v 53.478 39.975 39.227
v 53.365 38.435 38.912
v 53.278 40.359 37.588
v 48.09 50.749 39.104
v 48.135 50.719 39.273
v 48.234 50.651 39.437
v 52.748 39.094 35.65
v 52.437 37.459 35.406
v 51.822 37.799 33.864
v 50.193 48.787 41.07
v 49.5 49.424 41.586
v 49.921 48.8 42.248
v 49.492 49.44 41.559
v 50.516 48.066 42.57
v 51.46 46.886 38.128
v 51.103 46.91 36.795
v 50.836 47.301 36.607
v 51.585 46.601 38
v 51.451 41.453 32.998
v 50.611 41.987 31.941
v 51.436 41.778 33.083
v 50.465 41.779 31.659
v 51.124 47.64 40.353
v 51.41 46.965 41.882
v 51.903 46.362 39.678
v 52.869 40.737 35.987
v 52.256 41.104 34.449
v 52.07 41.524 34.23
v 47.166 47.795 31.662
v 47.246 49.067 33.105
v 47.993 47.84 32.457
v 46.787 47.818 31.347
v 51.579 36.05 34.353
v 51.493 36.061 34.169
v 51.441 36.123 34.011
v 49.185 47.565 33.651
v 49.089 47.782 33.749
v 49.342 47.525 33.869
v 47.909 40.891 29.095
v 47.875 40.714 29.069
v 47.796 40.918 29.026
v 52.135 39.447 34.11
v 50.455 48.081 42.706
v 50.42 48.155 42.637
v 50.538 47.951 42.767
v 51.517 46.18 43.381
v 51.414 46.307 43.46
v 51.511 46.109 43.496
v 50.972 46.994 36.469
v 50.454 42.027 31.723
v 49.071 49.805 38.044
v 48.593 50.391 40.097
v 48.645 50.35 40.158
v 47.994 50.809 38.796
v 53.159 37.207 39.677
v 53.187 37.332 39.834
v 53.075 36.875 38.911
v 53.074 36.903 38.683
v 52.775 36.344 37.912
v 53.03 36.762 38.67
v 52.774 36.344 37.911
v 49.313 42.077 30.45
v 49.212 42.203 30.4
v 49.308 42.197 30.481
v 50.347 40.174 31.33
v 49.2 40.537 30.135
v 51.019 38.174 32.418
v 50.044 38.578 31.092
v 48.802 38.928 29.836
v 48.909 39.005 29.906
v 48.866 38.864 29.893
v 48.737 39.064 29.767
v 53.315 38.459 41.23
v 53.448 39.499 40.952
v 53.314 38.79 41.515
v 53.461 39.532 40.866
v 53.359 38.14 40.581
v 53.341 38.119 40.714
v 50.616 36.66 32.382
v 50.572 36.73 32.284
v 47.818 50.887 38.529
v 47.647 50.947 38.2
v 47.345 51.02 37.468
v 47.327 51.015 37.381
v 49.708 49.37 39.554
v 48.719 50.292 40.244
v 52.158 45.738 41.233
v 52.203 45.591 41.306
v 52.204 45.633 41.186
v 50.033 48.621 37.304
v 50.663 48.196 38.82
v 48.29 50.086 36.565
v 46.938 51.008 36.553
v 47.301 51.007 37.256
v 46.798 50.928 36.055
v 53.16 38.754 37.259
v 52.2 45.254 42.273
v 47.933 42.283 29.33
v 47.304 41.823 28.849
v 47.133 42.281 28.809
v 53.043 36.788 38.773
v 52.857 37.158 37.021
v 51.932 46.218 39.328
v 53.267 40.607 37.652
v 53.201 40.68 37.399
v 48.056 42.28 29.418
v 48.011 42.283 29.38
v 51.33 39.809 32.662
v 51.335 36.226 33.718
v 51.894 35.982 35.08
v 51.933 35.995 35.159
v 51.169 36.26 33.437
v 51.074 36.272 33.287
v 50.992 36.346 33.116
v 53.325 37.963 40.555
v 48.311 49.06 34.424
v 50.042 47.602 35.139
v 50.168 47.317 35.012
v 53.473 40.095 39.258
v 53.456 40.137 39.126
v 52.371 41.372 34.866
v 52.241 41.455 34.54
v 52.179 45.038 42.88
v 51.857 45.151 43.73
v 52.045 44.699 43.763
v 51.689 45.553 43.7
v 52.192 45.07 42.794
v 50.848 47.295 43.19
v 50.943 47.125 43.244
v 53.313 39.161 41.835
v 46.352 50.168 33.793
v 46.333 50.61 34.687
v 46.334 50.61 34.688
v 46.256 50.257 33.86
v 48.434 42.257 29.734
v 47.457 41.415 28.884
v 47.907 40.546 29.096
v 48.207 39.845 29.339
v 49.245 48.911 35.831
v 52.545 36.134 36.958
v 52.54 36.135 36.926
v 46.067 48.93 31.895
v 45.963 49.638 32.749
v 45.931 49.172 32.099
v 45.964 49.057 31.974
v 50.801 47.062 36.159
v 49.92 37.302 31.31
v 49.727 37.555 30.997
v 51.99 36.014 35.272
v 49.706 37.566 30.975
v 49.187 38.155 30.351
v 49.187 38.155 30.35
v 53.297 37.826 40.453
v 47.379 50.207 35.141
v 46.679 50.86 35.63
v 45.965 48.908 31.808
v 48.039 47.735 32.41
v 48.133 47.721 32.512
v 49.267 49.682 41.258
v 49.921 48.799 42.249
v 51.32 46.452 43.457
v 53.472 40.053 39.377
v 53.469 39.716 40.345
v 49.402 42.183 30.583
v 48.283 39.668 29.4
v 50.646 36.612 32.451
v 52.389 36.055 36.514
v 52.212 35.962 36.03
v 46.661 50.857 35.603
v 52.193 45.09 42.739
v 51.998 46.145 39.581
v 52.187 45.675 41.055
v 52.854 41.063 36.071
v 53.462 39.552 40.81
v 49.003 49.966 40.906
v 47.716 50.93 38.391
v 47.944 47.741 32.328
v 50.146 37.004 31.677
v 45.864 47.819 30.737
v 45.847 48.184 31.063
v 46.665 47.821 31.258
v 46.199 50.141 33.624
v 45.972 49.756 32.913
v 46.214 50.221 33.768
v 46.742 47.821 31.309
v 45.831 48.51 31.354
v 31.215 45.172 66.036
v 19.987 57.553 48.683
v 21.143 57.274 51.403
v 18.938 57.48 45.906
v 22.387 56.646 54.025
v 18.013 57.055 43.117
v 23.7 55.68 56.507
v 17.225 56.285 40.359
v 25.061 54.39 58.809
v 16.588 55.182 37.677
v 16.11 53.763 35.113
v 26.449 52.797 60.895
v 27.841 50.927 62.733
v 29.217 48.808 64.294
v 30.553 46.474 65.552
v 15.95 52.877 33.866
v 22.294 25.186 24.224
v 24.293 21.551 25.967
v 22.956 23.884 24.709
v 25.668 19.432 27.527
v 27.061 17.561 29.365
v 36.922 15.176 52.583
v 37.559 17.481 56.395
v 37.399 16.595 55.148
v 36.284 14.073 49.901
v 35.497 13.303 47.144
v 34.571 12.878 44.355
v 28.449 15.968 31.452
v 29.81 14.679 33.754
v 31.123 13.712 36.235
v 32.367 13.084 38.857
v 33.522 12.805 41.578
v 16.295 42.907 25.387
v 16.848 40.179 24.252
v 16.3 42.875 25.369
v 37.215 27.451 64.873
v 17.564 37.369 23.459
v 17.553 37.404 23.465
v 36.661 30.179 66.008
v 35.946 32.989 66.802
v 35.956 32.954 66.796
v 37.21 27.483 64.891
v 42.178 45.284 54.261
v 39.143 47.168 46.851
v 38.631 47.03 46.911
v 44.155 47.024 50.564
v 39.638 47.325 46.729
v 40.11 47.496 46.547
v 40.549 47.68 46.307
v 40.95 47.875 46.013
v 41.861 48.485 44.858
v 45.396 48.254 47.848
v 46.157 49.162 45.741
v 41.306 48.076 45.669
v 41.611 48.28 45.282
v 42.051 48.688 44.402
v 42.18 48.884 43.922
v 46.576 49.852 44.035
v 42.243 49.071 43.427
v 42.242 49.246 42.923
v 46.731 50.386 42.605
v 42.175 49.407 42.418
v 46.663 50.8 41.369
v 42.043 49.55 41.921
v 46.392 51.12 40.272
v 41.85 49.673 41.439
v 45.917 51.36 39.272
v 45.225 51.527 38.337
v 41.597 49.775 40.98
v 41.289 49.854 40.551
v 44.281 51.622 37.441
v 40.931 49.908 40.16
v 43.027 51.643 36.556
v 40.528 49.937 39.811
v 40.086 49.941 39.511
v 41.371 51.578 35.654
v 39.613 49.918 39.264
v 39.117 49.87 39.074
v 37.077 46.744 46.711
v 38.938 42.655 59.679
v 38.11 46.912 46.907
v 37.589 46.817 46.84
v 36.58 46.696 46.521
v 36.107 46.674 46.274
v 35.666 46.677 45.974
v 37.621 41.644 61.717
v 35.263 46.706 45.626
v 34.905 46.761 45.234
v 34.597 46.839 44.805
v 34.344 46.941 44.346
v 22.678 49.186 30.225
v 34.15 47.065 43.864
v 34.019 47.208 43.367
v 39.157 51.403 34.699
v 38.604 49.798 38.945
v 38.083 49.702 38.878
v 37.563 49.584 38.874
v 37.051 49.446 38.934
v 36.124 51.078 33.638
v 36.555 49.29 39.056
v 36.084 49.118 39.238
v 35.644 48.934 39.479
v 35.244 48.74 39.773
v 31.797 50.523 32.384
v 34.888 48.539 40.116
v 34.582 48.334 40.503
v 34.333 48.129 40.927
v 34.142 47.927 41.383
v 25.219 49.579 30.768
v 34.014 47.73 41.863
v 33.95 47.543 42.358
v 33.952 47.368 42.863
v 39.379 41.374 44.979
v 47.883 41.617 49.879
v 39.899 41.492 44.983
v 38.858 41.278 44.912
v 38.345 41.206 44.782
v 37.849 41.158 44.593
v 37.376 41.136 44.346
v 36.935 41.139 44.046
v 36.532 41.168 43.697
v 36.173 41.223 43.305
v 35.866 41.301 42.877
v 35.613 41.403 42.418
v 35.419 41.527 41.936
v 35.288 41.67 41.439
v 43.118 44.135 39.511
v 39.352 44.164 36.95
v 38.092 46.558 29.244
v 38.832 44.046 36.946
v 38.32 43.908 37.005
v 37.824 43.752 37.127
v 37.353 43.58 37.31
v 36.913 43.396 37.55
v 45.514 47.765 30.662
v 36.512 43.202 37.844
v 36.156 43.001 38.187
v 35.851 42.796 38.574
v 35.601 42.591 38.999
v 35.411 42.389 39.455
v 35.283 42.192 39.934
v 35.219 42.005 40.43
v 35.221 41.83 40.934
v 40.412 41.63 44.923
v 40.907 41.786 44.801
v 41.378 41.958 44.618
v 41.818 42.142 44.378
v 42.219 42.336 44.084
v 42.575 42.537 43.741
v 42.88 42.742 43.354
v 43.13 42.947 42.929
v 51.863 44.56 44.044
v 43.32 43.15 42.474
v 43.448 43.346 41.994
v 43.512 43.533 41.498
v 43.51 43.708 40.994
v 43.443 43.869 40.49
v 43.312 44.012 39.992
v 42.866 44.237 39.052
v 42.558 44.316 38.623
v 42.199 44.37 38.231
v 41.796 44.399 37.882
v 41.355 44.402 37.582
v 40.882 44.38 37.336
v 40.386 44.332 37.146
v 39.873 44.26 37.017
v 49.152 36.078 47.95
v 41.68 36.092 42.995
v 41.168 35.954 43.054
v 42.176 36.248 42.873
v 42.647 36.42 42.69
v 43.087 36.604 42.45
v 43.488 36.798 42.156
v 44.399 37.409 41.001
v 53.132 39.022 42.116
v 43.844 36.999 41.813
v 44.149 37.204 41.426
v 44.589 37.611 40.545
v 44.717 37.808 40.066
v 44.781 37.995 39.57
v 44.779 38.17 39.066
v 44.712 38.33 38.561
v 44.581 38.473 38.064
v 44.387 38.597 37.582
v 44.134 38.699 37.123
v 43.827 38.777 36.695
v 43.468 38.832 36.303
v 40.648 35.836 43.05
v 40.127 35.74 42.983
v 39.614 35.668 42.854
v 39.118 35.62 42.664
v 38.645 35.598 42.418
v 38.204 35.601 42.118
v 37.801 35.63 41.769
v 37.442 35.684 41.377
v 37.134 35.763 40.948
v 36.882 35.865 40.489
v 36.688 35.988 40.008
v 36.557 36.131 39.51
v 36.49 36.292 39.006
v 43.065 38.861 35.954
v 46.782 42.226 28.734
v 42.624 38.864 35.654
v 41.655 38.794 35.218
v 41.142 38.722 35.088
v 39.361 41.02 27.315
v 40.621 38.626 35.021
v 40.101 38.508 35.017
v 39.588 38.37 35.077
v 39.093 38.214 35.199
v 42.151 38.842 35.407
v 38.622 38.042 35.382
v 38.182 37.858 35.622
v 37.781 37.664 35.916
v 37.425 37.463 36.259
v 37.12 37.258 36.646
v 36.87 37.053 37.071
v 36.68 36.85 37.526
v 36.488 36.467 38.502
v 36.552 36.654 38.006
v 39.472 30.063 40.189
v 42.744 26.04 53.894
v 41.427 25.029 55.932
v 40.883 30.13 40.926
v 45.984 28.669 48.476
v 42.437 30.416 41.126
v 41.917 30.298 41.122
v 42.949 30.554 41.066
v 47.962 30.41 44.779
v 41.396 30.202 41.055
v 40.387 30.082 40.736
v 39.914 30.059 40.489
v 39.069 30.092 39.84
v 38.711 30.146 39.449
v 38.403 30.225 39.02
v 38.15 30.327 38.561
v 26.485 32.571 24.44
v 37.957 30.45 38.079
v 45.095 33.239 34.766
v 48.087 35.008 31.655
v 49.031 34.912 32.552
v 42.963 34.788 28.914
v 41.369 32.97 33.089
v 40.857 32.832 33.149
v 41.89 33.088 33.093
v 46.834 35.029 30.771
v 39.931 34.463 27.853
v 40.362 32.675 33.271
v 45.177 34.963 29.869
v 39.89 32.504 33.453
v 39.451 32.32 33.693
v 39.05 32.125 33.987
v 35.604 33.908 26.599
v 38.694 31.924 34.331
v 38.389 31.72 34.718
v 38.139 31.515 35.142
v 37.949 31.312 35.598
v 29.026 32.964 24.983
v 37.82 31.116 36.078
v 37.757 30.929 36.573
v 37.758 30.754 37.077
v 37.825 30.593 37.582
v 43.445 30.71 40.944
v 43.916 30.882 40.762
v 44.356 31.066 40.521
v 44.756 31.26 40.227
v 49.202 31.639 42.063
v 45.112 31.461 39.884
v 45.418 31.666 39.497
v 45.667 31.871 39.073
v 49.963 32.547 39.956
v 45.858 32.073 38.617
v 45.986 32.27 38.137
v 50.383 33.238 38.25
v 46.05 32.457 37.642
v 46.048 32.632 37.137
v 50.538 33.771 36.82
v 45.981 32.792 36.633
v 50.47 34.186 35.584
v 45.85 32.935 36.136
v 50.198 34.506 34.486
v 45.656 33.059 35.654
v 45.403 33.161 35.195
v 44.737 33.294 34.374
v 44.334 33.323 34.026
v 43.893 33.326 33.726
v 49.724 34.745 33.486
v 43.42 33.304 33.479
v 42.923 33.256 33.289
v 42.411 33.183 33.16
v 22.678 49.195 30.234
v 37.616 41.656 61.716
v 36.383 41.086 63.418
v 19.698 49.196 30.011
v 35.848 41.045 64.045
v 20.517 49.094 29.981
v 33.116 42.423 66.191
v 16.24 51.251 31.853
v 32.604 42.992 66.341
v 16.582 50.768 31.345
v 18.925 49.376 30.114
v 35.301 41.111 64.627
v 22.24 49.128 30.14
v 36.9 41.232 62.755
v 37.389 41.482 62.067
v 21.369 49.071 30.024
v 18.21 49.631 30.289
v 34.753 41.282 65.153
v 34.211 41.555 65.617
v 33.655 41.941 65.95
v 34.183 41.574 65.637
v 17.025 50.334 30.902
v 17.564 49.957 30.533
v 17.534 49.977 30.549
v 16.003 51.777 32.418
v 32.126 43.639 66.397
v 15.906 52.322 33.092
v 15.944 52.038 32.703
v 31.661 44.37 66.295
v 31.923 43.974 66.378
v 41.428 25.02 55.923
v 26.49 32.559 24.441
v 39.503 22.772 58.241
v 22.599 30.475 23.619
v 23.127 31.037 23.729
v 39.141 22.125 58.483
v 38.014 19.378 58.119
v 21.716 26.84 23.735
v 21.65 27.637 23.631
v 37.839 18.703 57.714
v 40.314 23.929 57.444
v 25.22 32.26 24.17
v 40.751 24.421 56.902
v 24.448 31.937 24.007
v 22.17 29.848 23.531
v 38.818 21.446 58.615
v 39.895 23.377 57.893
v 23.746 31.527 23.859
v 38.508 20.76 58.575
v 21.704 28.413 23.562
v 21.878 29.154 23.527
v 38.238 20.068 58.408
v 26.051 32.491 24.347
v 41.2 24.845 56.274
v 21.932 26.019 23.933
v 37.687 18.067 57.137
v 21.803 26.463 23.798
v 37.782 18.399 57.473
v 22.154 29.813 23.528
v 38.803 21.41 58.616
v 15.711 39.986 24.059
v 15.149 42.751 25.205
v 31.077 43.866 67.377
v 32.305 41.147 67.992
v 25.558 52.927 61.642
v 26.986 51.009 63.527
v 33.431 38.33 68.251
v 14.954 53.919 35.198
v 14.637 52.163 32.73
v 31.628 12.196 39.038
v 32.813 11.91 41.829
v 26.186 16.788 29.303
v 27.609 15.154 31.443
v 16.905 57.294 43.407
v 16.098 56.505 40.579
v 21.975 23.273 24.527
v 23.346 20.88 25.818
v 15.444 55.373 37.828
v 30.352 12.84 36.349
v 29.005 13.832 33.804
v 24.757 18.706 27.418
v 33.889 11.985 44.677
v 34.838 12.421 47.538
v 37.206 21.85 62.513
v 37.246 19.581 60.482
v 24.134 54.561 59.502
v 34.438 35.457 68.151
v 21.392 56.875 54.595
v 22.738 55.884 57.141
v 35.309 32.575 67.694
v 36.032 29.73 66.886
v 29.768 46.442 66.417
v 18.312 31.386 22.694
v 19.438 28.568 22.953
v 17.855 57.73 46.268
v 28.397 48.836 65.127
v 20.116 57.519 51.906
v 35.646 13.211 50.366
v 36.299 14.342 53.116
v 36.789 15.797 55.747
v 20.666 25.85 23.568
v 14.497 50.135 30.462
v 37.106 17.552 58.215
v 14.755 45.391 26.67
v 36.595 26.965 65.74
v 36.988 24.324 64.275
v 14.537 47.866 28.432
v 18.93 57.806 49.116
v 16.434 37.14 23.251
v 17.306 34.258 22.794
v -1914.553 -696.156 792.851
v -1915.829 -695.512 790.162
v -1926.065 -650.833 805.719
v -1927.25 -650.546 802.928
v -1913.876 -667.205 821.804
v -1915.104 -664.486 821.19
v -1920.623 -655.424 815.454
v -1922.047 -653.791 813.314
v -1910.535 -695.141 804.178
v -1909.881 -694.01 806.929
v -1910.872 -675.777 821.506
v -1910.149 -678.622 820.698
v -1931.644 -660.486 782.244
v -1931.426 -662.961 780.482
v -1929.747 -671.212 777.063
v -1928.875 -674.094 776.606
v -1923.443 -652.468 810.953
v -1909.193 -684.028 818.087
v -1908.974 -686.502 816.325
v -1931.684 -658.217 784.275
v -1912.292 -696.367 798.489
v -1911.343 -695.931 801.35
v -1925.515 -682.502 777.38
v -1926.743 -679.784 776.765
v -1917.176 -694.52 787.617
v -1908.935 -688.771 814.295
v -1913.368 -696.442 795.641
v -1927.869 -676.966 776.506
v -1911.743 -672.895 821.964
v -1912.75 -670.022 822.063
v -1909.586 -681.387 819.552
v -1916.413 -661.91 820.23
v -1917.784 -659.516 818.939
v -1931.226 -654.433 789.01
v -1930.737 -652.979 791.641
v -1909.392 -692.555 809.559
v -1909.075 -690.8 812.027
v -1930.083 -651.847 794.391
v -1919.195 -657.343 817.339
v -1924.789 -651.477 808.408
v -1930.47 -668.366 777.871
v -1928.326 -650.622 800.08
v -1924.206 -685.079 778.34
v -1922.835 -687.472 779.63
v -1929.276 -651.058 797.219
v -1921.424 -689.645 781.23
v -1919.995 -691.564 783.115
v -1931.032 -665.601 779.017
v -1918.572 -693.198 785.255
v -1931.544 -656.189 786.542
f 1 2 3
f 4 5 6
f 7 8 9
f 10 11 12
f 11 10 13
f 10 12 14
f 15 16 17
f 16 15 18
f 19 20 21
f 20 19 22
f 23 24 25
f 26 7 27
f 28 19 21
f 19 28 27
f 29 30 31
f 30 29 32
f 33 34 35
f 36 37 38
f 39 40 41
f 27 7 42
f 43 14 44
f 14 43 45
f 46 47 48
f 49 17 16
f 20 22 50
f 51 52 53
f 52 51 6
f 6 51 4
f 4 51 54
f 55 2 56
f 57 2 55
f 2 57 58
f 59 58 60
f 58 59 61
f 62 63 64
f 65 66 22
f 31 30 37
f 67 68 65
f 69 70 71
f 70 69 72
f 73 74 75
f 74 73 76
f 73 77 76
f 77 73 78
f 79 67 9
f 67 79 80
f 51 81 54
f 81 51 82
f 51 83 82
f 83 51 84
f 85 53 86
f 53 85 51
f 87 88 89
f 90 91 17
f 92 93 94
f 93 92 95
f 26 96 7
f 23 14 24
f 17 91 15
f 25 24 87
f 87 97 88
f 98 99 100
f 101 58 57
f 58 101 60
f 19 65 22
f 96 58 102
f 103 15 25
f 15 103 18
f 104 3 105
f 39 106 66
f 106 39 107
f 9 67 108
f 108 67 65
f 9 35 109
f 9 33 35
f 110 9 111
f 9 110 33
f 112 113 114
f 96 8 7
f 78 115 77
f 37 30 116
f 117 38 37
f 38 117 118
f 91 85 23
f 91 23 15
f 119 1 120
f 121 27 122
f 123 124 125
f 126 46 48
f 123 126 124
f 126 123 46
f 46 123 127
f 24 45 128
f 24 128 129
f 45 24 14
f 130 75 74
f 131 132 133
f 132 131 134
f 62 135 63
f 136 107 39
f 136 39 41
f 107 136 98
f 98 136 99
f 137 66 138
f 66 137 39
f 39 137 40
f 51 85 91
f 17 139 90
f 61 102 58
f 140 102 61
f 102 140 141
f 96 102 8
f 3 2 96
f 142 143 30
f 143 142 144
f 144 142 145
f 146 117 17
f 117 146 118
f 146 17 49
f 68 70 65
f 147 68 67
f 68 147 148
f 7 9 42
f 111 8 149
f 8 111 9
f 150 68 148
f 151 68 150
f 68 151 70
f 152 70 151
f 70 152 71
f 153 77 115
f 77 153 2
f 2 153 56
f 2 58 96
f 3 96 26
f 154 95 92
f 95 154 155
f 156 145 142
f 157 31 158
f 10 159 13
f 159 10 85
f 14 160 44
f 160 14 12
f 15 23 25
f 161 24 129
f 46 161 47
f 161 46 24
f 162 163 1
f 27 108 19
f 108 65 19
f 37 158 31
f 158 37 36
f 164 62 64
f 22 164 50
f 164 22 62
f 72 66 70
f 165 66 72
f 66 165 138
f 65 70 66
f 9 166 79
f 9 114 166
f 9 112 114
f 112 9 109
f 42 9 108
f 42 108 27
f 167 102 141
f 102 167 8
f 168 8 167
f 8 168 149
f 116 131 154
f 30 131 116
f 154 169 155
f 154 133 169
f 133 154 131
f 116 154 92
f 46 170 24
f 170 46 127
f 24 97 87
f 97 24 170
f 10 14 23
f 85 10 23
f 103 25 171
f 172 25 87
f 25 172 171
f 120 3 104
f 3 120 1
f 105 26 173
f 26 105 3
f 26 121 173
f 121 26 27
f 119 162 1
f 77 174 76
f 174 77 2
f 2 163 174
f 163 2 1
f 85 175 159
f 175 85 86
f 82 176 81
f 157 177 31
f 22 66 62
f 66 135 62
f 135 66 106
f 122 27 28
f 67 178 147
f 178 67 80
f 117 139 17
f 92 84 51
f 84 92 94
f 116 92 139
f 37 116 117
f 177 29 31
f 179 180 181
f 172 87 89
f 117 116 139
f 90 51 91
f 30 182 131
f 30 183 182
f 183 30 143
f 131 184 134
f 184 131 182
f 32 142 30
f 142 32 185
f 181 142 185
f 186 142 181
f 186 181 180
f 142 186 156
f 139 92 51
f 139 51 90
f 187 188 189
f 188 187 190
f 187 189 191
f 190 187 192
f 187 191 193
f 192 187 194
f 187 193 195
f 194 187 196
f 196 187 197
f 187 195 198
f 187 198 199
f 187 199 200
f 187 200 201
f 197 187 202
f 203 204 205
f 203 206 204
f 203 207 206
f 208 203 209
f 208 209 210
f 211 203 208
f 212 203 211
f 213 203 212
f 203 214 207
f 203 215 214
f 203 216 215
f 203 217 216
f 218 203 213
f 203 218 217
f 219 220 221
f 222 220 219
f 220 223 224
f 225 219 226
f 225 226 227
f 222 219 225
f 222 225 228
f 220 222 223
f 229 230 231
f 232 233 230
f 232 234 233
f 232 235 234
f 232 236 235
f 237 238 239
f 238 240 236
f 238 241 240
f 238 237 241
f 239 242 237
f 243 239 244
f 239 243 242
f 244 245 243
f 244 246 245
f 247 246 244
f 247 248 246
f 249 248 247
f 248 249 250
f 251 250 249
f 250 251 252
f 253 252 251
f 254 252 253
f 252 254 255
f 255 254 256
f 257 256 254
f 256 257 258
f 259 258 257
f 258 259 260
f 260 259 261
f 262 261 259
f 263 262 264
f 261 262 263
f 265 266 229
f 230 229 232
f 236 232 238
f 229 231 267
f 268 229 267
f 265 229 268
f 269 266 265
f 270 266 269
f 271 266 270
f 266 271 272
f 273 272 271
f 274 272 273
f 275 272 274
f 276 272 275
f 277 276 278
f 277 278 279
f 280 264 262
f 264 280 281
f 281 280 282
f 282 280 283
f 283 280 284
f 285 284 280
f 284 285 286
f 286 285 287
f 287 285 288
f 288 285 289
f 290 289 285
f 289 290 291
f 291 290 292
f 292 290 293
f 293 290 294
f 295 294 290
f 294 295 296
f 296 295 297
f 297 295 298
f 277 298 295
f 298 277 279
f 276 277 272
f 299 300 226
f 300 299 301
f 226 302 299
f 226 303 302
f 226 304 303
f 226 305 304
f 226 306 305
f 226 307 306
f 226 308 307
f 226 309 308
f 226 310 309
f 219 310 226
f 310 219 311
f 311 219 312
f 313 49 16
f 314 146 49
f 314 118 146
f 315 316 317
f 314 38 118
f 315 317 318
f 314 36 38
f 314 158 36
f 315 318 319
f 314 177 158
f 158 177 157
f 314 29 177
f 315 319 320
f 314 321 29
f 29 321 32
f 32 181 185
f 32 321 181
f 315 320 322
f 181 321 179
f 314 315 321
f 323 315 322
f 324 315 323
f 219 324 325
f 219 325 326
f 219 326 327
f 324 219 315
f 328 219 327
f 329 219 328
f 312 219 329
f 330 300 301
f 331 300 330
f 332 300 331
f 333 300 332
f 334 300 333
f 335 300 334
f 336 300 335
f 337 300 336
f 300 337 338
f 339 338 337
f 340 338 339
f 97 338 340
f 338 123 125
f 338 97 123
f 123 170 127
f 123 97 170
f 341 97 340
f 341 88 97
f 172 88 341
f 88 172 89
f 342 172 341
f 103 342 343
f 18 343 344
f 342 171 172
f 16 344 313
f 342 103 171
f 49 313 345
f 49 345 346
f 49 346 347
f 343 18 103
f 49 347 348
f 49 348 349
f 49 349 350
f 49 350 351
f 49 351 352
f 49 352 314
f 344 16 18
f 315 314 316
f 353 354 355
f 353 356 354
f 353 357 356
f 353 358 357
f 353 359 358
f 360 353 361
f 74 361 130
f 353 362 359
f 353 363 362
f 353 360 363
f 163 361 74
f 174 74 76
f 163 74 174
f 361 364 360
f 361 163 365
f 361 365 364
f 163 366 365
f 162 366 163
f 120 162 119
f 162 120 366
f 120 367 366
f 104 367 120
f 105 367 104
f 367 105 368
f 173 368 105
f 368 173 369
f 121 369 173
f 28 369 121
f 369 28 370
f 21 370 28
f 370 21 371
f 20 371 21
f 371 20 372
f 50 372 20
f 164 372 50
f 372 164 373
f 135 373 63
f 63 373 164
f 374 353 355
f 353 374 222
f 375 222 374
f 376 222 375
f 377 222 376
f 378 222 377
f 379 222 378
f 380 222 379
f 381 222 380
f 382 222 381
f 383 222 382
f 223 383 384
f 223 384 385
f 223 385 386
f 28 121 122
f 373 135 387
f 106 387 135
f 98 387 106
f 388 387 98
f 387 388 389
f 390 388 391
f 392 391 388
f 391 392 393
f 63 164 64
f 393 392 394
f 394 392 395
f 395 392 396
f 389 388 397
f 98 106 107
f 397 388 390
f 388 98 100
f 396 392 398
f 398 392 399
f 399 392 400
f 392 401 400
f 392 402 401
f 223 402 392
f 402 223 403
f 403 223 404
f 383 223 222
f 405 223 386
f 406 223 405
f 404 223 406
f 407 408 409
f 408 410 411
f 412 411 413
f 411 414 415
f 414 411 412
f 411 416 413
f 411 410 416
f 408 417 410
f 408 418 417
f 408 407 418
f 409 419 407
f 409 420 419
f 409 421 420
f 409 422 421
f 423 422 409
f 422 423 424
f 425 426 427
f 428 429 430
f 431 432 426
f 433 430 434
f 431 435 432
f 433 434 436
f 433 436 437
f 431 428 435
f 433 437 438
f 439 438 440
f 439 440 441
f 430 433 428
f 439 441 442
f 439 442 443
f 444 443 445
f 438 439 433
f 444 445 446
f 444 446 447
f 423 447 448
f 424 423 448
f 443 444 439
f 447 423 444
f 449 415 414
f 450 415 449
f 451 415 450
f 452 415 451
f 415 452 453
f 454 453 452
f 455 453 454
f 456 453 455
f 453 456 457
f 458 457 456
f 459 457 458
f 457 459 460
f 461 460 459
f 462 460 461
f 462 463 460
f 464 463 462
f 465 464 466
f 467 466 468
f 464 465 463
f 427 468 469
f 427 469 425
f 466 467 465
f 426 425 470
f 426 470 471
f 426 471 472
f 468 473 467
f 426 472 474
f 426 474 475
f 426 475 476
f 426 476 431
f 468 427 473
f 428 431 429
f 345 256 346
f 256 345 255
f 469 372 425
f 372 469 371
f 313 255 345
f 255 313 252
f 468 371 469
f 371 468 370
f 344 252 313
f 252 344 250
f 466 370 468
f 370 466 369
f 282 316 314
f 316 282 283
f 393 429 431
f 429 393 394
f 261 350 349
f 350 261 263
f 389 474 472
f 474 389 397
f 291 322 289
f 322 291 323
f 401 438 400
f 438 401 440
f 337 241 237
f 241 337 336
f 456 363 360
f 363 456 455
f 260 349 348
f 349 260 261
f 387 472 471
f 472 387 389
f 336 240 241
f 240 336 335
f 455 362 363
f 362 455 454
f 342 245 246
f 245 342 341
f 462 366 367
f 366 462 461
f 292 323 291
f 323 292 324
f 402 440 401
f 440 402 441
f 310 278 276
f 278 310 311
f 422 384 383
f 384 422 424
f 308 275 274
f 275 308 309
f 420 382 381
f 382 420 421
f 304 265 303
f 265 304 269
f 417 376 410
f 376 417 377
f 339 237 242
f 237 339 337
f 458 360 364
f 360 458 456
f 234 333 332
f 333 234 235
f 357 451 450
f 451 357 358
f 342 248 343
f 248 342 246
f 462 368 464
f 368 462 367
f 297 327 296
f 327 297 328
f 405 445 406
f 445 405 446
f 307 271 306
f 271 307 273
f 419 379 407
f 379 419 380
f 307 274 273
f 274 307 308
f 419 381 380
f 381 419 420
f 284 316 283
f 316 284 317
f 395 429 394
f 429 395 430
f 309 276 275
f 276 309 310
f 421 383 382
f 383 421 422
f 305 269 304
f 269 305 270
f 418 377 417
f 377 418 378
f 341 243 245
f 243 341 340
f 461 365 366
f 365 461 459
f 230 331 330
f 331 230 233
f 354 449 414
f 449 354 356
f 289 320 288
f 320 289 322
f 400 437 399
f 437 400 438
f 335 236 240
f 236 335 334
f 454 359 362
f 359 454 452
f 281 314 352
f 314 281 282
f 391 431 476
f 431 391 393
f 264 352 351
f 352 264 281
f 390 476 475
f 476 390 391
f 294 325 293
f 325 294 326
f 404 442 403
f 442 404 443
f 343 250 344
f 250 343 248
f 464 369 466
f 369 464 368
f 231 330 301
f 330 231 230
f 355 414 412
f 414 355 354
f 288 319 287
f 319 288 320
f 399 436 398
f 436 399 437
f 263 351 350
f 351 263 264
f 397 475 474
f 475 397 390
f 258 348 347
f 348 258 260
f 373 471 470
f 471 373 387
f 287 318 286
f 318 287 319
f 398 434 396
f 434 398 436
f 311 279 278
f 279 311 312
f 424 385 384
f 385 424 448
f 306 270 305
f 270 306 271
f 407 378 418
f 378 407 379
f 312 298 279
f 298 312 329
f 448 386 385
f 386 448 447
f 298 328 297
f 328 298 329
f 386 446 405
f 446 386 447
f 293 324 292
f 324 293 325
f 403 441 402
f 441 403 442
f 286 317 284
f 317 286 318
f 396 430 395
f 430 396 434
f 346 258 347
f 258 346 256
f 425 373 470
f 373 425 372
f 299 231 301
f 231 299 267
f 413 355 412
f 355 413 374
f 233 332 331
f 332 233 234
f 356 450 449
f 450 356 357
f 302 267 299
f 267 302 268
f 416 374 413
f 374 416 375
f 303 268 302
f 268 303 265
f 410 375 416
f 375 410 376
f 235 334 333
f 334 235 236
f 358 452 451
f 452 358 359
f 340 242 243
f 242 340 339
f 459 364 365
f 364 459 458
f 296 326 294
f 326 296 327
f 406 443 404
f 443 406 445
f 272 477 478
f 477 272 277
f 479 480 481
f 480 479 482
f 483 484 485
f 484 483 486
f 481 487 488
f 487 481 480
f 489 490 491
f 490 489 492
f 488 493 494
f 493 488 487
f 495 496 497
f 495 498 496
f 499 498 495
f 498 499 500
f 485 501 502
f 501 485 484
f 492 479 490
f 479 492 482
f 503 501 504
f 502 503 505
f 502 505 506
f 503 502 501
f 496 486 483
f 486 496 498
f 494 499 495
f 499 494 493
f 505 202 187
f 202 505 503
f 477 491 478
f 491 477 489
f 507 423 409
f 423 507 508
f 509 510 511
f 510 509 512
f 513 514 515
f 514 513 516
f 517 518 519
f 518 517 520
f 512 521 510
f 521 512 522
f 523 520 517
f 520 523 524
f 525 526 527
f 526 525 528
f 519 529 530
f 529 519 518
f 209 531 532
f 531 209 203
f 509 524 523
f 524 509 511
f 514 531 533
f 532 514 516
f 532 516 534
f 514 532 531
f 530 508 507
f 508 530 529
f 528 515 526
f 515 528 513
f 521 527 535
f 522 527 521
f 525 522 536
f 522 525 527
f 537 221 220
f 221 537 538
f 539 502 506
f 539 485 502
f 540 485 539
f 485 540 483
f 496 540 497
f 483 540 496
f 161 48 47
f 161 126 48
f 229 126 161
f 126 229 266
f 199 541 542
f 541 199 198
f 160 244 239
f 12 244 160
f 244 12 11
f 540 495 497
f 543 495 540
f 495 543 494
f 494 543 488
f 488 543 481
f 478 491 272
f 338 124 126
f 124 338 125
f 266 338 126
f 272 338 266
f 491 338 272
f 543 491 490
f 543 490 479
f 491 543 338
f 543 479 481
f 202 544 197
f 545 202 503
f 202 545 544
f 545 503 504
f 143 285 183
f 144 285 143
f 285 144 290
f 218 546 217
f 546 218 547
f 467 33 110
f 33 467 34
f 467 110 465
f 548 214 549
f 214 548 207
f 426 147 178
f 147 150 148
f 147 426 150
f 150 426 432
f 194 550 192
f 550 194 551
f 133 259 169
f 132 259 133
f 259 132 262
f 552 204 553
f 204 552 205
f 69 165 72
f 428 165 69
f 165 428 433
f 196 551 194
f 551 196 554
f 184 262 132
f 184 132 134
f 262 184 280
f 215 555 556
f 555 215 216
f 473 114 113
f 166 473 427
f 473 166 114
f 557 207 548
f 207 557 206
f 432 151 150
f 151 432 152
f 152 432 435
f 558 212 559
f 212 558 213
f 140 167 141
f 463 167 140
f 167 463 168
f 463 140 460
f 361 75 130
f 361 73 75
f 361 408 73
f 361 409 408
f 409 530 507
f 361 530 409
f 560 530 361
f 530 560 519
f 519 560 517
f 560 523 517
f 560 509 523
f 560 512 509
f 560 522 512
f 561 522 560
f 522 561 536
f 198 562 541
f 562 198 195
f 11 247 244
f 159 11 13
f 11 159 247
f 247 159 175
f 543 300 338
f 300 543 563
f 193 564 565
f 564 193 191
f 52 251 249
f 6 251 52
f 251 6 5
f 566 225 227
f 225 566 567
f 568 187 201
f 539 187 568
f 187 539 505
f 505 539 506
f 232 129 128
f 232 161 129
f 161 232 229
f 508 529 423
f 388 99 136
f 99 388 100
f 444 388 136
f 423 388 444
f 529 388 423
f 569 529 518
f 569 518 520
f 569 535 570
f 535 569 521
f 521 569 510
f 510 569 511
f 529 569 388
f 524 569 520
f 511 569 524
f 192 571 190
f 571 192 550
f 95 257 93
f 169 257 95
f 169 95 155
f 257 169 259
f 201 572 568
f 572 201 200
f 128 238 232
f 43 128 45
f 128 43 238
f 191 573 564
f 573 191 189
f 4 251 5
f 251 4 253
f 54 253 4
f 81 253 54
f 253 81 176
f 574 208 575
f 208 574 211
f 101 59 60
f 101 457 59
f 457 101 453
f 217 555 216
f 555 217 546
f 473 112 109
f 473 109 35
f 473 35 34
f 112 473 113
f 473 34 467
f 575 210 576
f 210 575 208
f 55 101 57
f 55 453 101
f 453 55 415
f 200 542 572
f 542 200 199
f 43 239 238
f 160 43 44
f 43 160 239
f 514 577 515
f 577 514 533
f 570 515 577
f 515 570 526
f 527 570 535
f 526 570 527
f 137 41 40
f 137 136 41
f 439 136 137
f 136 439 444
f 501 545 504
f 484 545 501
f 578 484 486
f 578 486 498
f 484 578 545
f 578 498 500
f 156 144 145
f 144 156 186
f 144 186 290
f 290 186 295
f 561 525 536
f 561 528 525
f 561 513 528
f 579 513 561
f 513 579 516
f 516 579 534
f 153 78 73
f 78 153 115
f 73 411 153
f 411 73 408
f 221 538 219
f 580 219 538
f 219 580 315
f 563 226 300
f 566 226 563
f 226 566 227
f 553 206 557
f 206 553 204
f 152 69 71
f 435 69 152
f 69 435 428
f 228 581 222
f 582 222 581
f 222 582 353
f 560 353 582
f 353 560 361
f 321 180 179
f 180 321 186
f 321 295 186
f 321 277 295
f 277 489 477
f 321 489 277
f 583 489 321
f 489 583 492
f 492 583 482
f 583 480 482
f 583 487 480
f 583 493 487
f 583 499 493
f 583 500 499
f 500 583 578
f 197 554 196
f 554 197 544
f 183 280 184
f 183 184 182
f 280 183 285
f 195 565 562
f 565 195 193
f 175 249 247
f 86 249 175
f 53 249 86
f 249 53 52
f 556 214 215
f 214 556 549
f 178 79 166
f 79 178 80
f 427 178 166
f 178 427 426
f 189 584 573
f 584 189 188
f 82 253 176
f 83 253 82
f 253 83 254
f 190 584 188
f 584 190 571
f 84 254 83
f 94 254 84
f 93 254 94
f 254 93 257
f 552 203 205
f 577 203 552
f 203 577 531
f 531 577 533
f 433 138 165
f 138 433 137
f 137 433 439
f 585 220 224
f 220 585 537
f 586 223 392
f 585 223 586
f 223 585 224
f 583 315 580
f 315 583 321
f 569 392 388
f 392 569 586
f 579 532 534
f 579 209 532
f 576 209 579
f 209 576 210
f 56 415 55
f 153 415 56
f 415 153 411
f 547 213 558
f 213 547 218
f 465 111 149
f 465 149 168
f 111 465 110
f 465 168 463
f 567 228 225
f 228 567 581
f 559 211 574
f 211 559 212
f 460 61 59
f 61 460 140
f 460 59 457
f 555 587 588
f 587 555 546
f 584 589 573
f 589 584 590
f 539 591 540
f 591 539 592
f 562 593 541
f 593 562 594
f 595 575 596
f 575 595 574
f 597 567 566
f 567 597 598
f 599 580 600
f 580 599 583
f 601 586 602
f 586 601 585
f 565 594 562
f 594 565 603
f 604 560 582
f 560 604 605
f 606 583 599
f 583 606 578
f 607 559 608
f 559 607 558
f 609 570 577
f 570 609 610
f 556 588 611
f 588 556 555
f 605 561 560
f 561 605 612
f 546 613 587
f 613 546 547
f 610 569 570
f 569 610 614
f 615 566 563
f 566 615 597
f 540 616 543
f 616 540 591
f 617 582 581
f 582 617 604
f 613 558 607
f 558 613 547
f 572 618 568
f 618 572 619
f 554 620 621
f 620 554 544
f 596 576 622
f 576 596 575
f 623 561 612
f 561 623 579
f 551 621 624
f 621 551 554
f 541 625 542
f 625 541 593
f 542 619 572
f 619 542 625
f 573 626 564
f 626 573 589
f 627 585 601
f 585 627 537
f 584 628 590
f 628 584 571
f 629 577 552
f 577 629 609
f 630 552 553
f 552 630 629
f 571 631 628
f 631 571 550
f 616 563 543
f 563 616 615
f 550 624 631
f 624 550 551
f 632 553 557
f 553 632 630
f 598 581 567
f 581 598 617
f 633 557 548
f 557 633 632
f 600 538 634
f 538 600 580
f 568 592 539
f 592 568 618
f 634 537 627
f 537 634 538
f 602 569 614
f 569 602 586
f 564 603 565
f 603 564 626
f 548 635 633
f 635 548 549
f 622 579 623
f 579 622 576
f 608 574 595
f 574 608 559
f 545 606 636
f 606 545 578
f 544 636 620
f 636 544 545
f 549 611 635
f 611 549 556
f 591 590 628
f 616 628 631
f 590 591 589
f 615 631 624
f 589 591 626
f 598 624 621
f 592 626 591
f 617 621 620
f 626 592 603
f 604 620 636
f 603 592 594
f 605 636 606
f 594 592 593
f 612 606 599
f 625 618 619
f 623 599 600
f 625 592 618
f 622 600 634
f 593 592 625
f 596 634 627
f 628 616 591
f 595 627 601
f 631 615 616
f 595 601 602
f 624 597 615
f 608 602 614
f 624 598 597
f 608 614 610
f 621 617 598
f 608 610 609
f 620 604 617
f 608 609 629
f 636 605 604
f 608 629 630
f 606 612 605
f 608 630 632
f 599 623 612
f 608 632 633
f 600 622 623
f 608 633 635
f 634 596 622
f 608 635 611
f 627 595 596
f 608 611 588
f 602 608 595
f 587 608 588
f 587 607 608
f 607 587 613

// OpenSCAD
// file: ../Parts/ShplRoz.scad
ShplRoz();

    gikLen = 2200;
    diamVnesh = 48.5;
    platformThickns = 5;
    ushiThickns = 6;
    lenA = 40;
    shplintDia = 8.5;
    shplintHoleHeight = 15;

module ShplRoz() {

    intersection() {
        
        union() {
            
            //Цилиндр
            translate([+platformThickns-1,0,0]) 
            rotate([0,-90,0]) 
            cylinder(h=shplintHoleHeight+platformThickns, d=diamVnesh);   // Эта часть такая, какая нужна.    

            // Сфера
            sphere(d = ushiThickns*4.5);
       } 

       ConicBar();

    }

    //Цилиндр затычки, высотой 4мм 
    translate([-shplintHoleHeight-1,0,0]) 
    rotate([0,-90,0]) 
    cylinder(h=platformThickns-1, d=diamVnesh);    

}




module ConicBar() {
    
    intersection() { 

        union() {
                                        
            // Шайба 1мм
            translate([-shplintHoleHeight,0,0]) 
            rotate([0,-90,0]) 
            cylinder(h=1, d=diamVnesh);
    
            // Захваты упора с дырками.
            difference(){ 
                    
                // Захваты упора.
                union() {  
                    translate([-shplintHoleHeight,ushiThickns /2 ,-diamVnesh/2]) 
                    cube([lenA,ushiThickns ,diamVnesh]);    

                    translate([-shplintHoleHeight,-3*ushiThickns /2 ,-diamVnesh/2]) 
                    cube([lenA,ushiThickns ,diamVnesh]);
                        
                }
                    
                // Дырки для шплинта ( вырез цилиндра )
                translate([0 ,-1-ushiThickns*3/2,0]) 
                rotate([-90,0,0]) 
                cylinder(h=ushiThickns *3+2, d=shplintDia); 

            }
        
            // Стыки
            difference() {

                translate([-shplintHoleHeight,3*ushiThickns /2 ,-diamVnesh/2]) 
                cube([ushiThickns,ushiThickns ,diamVnesh]);    

                translate([-shplintHoleHeight + ushiThickns,5*ushiThickns/2,-diamVnesh/2]) 
                rotate([0,0,0]) 
                cylinder(h=diamVnesh, d=ushiThickns*2  );       
            }
            difference() {

                translate([-shplintHoleHeight,-5*ushiThickns /2 ,-diamVnesh/2]) 
                cube([ushiThickns,ushiThickns ,diamVnesh]);      

                translate([-shplintHoleHeight + ushiThickns,-5*ushiThickns/2,-diamVnesh/2]) 
                rotate([0,0,0]) 
                cylinder(h=diamVnesh, d=ushiThickns*2  );       
            }   
        
        }

        // Конус. Нужно оставить то, что в нём.
        translate([-shplintHoleHeight-1,0,0]) 
        rotate([0,90,0]) 
        cylinder(h=platformThickns*8, d1=diamVnesh, d2=0);   // Пересекаем с этим конусом.
   
    } // Пересечение
}   // Модуль ConicBar
// file: Boom.scad
use <../Parts/ShplRoz.scad>;

Boom();

    gikLen = 2200;
    diamVnesh = 48.5;
    platformThickns = 5;
    ushiThickns = 6;
    lenA = 40;
    shplintDia = 8.5;
    shplintHoleHeight = 15;


module Boom() {
    
    $fn = 50;
    
    px = - platformThickns  - shplintHoleHeight;
    translate([px,0,0]) rotate([0,-90,0]) cylinder(h=gikLen, d=diamVnesh);        // сам гик
    ShplRoz();
}
// main file
use <Boom.scad>;

translate([40,40,40]) rotate([20,20,20]) Boom();
